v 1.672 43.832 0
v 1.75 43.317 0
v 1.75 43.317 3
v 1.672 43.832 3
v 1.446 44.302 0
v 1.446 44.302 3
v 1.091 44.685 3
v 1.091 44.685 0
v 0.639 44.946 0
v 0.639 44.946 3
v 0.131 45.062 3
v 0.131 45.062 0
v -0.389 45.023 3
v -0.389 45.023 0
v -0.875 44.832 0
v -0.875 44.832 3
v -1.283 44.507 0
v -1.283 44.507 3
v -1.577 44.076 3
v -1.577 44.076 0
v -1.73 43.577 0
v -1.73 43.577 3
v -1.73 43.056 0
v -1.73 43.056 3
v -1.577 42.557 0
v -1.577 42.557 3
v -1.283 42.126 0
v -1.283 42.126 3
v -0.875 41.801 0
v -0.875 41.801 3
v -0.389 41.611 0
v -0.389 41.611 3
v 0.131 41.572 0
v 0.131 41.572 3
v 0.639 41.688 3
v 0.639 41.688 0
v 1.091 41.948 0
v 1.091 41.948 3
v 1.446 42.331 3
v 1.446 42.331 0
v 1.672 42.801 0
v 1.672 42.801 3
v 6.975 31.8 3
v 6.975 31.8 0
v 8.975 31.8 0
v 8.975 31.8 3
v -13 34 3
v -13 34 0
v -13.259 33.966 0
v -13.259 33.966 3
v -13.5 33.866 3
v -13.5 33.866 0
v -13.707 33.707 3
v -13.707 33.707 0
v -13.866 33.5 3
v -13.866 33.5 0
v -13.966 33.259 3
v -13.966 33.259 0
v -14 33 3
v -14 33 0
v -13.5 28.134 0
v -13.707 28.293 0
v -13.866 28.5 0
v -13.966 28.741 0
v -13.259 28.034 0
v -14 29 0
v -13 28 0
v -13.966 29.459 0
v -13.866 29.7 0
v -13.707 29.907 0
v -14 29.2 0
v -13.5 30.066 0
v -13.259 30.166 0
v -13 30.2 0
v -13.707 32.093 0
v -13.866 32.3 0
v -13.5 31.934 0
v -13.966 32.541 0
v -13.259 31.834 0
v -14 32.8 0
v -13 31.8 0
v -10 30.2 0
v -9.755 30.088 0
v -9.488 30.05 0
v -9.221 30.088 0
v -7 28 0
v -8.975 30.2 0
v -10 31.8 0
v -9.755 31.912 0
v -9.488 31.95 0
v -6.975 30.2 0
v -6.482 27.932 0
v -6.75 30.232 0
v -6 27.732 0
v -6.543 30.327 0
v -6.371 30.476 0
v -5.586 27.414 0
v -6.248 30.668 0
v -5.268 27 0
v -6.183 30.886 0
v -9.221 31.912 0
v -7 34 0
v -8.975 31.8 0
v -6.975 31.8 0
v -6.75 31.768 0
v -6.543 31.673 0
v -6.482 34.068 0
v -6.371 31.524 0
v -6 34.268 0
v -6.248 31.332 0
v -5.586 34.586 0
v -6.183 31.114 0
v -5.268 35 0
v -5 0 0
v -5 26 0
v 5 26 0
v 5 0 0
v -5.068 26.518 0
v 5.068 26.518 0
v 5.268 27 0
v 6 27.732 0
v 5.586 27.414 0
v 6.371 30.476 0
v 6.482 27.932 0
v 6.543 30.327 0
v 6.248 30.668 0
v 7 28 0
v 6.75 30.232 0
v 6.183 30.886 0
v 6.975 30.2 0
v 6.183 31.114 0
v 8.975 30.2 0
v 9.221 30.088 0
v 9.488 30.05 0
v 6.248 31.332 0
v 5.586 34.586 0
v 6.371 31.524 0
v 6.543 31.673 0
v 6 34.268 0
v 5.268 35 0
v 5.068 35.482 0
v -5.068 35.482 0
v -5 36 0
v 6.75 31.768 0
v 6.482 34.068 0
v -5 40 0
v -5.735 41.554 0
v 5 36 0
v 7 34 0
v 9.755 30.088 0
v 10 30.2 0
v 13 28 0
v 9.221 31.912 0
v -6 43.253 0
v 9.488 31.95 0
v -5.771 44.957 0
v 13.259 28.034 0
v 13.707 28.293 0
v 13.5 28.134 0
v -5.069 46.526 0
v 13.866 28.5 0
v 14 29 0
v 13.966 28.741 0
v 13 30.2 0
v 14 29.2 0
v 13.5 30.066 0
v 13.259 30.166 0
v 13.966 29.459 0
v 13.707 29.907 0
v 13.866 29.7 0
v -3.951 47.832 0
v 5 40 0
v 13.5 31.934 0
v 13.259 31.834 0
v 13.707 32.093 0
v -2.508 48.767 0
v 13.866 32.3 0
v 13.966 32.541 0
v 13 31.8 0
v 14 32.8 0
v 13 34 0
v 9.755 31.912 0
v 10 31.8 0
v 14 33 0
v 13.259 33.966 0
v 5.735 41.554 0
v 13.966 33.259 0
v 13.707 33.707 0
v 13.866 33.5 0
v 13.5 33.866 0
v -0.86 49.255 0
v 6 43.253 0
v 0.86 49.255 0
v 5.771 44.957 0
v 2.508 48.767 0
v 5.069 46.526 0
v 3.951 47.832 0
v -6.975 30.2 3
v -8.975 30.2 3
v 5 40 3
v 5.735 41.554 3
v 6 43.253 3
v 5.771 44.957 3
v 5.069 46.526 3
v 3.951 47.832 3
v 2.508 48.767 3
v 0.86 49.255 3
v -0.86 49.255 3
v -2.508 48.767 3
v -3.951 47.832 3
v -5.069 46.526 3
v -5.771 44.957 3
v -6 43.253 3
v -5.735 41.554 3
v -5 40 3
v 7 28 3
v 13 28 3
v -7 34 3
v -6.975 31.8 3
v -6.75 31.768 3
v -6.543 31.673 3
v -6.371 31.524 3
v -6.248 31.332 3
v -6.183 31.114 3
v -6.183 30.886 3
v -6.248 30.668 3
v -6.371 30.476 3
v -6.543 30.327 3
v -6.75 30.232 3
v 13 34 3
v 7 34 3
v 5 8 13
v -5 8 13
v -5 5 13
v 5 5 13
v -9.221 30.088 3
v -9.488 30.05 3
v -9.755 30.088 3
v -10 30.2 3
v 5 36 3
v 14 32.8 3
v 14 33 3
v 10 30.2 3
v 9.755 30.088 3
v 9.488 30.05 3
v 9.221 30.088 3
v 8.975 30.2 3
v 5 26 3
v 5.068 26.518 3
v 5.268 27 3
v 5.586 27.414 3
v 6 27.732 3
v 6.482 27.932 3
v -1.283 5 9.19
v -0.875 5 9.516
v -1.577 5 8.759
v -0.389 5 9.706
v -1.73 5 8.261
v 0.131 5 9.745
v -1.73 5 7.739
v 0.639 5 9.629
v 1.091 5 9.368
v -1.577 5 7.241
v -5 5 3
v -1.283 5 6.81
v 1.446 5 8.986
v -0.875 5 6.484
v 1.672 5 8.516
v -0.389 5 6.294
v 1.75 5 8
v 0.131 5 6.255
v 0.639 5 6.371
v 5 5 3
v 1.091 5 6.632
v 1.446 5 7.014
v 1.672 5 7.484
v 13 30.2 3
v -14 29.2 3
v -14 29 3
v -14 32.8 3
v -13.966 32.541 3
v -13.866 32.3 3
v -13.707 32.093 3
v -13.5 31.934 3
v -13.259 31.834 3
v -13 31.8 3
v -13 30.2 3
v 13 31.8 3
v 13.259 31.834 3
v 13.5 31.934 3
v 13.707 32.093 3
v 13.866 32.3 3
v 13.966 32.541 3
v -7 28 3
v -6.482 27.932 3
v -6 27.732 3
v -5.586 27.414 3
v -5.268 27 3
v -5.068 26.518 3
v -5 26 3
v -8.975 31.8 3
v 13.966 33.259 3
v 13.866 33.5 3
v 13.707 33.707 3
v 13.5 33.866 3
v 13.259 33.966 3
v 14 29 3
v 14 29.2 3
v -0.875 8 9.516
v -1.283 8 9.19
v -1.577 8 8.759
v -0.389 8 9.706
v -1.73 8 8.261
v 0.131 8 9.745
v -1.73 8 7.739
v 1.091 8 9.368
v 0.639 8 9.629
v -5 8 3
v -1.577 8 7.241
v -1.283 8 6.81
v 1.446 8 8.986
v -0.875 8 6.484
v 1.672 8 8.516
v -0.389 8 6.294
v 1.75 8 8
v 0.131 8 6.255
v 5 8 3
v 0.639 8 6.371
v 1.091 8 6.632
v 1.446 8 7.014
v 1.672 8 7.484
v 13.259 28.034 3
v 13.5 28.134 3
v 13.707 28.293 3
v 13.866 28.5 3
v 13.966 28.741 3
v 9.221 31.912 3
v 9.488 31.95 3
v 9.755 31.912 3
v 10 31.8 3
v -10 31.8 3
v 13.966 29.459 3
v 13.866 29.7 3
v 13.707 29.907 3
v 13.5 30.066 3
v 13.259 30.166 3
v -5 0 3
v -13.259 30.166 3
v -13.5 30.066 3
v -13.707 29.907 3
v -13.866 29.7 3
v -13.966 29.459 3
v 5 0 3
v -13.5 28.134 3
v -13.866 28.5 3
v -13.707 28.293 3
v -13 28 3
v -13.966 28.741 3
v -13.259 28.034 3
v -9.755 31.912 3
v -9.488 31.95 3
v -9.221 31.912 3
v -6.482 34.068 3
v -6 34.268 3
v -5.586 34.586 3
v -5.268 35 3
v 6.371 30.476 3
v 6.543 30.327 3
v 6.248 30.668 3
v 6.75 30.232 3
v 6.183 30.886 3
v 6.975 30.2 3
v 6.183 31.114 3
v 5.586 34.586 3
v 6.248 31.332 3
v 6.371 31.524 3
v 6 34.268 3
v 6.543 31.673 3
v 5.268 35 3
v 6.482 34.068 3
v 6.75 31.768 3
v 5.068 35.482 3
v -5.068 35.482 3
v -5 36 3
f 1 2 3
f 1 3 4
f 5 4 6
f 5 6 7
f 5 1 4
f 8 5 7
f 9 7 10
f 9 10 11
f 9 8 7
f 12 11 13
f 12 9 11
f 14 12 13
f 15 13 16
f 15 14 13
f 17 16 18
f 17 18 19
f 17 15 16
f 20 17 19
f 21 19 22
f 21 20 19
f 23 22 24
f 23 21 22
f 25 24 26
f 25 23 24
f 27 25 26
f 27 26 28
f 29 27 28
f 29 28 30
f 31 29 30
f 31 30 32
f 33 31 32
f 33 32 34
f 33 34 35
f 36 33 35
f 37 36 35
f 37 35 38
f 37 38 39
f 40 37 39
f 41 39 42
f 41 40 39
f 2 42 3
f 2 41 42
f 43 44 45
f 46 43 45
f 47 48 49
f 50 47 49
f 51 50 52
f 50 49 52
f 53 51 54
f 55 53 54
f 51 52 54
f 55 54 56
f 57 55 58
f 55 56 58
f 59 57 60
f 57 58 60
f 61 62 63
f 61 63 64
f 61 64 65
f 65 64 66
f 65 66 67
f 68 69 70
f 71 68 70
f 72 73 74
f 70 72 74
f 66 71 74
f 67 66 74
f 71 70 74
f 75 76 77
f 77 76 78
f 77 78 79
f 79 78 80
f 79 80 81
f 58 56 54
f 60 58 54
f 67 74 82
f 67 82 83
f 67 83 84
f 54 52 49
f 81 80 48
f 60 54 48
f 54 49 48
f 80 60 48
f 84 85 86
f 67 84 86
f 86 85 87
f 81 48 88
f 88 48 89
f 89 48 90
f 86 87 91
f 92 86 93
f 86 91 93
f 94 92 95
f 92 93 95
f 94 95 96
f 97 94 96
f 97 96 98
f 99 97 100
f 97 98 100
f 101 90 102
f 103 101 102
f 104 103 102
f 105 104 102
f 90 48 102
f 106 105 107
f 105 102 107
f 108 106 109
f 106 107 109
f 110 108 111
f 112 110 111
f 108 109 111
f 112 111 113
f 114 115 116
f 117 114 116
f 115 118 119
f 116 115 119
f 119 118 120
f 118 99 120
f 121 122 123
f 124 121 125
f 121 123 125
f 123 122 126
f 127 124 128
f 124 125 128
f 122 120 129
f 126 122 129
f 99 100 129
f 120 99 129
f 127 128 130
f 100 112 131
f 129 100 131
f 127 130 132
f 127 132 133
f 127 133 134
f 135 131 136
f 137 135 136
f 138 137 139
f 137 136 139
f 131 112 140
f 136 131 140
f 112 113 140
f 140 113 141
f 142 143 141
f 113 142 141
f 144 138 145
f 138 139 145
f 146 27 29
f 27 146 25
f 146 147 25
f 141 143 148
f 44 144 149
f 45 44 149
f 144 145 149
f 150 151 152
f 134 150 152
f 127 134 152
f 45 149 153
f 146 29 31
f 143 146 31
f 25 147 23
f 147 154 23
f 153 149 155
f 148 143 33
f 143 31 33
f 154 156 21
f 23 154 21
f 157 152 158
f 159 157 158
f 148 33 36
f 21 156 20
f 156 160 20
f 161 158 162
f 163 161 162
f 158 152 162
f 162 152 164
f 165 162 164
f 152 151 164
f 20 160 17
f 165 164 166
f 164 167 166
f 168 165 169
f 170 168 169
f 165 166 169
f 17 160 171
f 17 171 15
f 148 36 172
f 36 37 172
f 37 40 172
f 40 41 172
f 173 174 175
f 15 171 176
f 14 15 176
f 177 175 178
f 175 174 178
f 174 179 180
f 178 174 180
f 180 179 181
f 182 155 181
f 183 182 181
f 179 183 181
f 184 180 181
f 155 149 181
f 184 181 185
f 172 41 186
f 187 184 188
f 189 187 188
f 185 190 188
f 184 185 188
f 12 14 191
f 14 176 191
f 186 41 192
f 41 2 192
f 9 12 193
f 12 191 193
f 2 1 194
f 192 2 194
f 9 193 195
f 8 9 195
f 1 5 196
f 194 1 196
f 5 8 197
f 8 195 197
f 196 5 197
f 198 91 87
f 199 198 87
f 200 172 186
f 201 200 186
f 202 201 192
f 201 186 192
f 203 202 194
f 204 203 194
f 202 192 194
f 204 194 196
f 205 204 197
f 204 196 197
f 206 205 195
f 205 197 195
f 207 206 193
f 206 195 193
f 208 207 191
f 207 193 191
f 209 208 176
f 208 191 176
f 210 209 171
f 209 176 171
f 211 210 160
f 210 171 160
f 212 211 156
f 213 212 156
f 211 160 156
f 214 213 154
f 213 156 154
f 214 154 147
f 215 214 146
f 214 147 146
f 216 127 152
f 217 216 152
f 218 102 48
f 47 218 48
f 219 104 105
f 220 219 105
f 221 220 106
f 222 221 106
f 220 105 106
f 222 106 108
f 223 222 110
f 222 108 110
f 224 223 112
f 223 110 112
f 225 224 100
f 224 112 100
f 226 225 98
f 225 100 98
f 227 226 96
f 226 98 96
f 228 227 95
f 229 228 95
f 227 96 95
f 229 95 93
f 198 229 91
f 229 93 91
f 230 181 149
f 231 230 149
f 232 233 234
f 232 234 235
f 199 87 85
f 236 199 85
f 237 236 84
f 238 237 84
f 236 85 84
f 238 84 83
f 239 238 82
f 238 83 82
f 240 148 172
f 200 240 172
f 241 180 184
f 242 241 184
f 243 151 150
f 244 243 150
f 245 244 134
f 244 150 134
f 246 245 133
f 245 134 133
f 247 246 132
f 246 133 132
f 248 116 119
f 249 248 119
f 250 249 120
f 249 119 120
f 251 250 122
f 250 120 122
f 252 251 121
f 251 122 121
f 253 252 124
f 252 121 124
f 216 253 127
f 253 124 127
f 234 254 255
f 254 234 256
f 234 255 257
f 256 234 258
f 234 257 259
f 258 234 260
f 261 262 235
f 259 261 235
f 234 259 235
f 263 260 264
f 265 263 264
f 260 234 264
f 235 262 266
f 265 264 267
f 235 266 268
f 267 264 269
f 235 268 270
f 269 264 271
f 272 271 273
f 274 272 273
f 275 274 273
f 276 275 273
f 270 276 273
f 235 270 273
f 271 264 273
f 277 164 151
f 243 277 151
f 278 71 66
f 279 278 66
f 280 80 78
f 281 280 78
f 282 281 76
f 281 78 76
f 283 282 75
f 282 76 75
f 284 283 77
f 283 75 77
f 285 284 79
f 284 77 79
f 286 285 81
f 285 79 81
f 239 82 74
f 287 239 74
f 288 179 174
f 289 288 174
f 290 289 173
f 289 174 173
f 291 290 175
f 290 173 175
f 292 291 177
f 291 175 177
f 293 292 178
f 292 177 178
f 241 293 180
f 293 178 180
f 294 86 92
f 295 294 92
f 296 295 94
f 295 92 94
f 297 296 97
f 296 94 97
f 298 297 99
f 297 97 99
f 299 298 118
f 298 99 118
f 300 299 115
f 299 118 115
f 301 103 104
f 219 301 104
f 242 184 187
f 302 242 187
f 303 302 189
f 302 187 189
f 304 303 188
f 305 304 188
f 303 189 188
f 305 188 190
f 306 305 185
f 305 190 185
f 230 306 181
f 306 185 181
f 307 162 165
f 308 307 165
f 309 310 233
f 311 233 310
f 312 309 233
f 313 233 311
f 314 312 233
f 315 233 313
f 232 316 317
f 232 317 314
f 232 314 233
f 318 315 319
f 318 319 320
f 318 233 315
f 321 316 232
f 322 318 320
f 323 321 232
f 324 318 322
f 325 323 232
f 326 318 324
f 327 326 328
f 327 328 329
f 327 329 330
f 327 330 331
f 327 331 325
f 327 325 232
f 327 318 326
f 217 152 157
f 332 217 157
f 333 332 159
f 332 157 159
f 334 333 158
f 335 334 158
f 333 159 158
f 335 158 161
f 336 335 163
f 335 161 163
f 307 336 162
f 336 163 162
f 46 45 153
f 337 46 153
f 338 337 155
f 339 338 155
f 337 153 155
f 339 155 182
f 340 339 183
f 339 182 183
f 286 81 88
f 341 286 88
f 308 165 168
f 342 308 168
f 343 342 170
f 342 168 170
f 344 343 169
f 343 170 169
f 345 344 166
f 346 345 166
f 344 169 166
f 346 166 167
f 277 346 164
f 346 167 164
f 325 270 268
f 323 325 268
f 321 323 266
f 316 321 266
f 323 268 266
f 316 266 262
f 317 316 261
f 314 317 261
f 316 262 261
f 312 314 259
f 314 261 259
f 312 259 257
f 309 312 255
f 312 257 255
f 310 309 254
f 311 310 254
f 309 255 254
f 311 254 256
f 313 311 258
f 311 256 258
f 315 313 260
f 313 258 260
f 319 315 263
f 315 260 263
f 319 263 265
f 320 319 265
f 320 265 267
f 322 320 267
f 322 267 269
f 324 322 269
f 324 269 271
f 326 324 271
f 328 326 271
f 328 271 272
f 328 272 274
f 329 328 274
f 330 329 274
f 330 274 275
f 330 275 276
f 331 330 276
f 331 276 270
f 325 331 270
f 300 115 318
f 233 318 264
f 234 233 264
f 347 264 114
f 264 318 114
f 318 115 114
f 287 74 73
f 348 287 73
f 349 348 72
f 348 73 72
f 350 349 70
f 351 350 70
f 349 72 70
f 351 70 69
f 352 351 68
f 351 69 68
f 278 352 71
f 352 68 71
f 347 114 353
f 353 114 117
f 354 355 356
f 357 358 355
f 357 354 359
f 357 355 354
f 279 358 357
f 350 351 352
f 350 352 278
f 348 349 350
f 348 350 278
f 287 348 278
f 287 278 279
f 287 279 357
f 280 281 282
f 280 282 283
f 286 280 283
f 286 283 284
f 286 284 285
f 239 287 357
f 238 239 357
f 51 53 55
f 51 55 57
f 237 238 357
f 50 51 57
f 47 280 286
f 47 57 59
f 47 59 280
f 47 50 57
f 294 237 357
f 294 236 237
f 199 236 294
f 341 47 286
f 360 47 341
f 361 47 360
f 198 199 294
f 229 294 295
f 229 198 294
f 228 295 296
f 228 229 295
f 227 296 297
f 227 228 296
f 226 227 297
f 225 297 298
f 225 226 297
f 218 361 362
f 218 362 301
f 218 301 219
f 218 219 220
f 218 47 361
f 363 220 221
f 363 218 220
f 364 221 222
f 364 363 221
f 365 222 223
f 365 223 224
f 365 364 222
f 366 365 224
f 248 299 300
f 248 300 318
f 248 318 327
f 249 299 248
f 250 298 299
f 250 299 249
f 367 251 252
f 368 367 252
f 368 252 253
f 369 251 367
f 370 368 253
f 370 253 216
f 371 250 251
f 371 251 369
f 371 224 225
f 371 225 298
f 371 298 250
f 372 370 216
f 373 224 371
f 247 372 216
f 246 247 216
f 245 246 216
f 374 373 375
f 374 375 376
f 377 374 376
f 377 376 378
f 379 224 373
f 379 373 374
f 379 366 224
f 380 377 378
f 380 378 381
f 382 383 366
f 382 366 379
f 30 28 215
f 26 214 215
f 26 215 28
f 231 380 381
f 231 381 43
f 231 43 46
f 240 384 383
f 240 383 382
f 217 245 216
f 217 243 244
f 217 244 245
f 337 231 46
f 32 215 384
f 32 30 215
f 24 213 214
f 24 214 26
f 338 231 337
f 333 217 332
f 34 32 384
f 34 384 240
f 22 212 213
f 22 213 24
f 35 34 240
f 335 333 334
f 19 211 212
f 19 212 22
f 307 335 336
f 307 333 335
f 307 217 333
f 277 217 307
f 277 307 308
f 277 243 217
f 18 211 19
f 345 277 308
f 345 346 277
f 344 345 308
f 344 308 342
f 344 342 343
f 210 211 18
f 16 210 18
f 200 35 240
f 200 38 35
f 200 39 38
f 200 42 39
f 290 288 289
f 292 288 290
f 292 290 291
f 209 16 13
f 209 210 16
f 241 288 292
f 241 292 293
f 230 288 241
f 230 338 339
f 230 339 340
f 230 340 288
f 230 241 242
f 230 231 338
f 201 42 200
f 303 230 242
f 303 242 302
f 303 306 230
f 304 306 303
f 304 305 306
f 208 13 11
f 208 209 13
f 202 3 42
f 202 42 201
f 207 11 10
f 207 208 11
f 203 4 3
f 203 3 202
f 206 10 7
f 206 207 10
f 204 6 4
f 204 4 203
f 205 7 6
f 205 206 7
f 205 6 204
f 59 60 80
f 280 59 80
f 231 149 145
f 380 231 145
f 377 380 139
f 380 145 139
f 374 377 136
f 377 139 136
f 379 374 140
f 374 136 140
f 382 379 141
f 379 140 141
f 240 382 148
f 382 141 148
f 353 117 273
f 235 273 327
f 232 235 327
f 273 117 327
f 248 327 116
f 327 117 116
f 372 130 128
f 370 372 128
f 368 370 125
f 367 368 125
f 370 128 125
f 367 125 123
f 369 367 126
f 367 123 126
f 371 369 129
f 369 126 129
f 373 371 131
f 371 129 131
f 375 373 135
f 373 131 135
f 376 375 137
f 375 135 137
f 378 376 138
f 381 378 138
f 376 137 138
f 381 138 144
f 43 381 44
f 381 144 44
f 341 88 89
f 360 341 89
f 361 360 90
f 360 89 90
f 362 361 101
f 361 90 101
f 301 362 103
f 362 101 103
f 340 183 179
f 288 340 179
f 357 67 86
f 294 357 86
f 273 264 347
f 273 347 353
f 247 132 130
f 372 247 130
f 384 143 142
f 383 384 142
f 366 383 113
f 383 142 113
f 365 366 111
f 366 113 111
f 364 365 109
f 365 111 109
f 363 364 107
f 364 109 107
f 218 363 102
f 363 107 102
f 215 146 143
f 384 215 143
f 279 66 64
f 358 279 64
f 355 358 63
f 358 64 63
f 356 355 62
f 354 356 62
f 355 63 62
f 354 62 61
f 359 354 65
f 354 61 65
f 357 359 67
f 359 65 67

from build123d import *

# Parameters (mm, degrees)
F0_R     = 1.75
F1_DEPTH = 3
F2_W     = 10
F2_H     = 3
F3_DEPTH = 10
F4_R     = 1.75
F5_DEPTH = 44.317625


with BuildPart() as f1:
    # F0 (on Top) → F1 (new body)
    with BuildSketch(Plane.XY):
        with BuildLine():
            Line((-5, 26), (-5, 0))
            Line((-5, 0), (5, 0))
            Line((5, 0), (5, 26))
            ThreePointArc((5, 26), (5.585786, 27.414214), (7, 28))
            Line((7, 28), (13, 28))
            ThreePointArc((13, 28), (13.707107, 28.292893), (14, 29))
            Line((14, 29), (14, 29.2))
            ThreePointArc((14, 29.2), (13.707107, 29.907107), (13, 30.2))
            Line((13, 30.2), (10, 30.2))
            ThreePointArc((10, 30.2), (9.487652, 30.05), (8.975305, 30.2))
            Line((8.975305, 30.2), (6.975305, 30.2))
            ThreePointArc((6.975305, 30.2), (6.175305, 31), (6.975305, 31.8))
            Line((6.975305, 31.8), (8.975305, 31.8))
            ThreePointArc((8.975305, 31.8), (9.487652, 31.95), (10, 31.8))
            Line((10, 31.8), (13, 31.8))
            ThreePointArc((13, 31.8), (13.707107, 32.092893), (14, 32.8))
            Line((14, 32.8), (14, 33))
            ThreePointArc((14, 33), (13.707107, 33.707107), (13, 34))
            Line((13, 34), (7, 34))
            ThreePointArc((7, 34), (5.585786, 34.585786), (5, 36))
            Line((5, 36), (5, 40))
            ThreePointArc((5, 40), (0, 49.316625), (-5, 40))
            Line((-5, 40), (-5, 36))
            ThreePointArc((-5, 36), (-5.585786, 34.585786), (-7, 34))
            Line((-7, 34), (-13, 34))
            ThreePointArc((-13, 34), (-13.707107, 33.707107), (-14, 33))
            Line((-14, 33), (-14, 32.8))
            ThreePointArc((-14, 32.8), (-13.707107, 32.092893), (-13, 31.8))
            Line((-13, 31.8), (-10, 31.8))
            ThreePointArc((-10, 31.8), (-9.487652, 31.95), (-8.975305, 31.8))
            Line((-8.975305, 31.8), (-6.975305, 31.8))
            ThreePointArc((-6.975305, 31.8), (-6.175305, 31), (-6.975305, 30.2))
            Line((-6.975305, 30.2), (-8.975305, 30.2))
            ThreePointArc((-8.975305, 30.2), (-9.487652, 30.05), (-10, 30.2))
            Line((-10, 30.2), (-13, 30.2))
            ThreePointArc((-13, 30.2), (-13.707107, 29.907107), (-14, 29.2))
            Line((-14, 29.2), (-14, 29))
            ThreePointArc((-14, 29), (-13.707107, 28.292893), (-13, 28))
            Line((-13, 28), (-7, 28))
            ThreePointArc((-7, 28), (-5.585786, 27.414214), (-5, 26))
        make_face()
        with Locations((0, 43.316625)):
            Circle(F0_R, mode=Mode.SUBTRACT)
    extrude(amount=F1_DEPTH)

    # F2 (on face) → F3 (join)
    with BuildSketch(Plane.XY.offset(3)):
        with Locations((0, 6.5)):
            Rectangle(F2_W, F2_H)
    extrude(amount=F3_DEPTH)

    # F4 (on face) → F5 (cut, through all)
    with BuildSketch(Plane.XZ.offset(-5)):
        with Locations((0, 8)):
            Circle(F4_R)
    extrude(amount=-F5_DEPTH, mode=Mode.SUBTRACT)


solid = f1.part
